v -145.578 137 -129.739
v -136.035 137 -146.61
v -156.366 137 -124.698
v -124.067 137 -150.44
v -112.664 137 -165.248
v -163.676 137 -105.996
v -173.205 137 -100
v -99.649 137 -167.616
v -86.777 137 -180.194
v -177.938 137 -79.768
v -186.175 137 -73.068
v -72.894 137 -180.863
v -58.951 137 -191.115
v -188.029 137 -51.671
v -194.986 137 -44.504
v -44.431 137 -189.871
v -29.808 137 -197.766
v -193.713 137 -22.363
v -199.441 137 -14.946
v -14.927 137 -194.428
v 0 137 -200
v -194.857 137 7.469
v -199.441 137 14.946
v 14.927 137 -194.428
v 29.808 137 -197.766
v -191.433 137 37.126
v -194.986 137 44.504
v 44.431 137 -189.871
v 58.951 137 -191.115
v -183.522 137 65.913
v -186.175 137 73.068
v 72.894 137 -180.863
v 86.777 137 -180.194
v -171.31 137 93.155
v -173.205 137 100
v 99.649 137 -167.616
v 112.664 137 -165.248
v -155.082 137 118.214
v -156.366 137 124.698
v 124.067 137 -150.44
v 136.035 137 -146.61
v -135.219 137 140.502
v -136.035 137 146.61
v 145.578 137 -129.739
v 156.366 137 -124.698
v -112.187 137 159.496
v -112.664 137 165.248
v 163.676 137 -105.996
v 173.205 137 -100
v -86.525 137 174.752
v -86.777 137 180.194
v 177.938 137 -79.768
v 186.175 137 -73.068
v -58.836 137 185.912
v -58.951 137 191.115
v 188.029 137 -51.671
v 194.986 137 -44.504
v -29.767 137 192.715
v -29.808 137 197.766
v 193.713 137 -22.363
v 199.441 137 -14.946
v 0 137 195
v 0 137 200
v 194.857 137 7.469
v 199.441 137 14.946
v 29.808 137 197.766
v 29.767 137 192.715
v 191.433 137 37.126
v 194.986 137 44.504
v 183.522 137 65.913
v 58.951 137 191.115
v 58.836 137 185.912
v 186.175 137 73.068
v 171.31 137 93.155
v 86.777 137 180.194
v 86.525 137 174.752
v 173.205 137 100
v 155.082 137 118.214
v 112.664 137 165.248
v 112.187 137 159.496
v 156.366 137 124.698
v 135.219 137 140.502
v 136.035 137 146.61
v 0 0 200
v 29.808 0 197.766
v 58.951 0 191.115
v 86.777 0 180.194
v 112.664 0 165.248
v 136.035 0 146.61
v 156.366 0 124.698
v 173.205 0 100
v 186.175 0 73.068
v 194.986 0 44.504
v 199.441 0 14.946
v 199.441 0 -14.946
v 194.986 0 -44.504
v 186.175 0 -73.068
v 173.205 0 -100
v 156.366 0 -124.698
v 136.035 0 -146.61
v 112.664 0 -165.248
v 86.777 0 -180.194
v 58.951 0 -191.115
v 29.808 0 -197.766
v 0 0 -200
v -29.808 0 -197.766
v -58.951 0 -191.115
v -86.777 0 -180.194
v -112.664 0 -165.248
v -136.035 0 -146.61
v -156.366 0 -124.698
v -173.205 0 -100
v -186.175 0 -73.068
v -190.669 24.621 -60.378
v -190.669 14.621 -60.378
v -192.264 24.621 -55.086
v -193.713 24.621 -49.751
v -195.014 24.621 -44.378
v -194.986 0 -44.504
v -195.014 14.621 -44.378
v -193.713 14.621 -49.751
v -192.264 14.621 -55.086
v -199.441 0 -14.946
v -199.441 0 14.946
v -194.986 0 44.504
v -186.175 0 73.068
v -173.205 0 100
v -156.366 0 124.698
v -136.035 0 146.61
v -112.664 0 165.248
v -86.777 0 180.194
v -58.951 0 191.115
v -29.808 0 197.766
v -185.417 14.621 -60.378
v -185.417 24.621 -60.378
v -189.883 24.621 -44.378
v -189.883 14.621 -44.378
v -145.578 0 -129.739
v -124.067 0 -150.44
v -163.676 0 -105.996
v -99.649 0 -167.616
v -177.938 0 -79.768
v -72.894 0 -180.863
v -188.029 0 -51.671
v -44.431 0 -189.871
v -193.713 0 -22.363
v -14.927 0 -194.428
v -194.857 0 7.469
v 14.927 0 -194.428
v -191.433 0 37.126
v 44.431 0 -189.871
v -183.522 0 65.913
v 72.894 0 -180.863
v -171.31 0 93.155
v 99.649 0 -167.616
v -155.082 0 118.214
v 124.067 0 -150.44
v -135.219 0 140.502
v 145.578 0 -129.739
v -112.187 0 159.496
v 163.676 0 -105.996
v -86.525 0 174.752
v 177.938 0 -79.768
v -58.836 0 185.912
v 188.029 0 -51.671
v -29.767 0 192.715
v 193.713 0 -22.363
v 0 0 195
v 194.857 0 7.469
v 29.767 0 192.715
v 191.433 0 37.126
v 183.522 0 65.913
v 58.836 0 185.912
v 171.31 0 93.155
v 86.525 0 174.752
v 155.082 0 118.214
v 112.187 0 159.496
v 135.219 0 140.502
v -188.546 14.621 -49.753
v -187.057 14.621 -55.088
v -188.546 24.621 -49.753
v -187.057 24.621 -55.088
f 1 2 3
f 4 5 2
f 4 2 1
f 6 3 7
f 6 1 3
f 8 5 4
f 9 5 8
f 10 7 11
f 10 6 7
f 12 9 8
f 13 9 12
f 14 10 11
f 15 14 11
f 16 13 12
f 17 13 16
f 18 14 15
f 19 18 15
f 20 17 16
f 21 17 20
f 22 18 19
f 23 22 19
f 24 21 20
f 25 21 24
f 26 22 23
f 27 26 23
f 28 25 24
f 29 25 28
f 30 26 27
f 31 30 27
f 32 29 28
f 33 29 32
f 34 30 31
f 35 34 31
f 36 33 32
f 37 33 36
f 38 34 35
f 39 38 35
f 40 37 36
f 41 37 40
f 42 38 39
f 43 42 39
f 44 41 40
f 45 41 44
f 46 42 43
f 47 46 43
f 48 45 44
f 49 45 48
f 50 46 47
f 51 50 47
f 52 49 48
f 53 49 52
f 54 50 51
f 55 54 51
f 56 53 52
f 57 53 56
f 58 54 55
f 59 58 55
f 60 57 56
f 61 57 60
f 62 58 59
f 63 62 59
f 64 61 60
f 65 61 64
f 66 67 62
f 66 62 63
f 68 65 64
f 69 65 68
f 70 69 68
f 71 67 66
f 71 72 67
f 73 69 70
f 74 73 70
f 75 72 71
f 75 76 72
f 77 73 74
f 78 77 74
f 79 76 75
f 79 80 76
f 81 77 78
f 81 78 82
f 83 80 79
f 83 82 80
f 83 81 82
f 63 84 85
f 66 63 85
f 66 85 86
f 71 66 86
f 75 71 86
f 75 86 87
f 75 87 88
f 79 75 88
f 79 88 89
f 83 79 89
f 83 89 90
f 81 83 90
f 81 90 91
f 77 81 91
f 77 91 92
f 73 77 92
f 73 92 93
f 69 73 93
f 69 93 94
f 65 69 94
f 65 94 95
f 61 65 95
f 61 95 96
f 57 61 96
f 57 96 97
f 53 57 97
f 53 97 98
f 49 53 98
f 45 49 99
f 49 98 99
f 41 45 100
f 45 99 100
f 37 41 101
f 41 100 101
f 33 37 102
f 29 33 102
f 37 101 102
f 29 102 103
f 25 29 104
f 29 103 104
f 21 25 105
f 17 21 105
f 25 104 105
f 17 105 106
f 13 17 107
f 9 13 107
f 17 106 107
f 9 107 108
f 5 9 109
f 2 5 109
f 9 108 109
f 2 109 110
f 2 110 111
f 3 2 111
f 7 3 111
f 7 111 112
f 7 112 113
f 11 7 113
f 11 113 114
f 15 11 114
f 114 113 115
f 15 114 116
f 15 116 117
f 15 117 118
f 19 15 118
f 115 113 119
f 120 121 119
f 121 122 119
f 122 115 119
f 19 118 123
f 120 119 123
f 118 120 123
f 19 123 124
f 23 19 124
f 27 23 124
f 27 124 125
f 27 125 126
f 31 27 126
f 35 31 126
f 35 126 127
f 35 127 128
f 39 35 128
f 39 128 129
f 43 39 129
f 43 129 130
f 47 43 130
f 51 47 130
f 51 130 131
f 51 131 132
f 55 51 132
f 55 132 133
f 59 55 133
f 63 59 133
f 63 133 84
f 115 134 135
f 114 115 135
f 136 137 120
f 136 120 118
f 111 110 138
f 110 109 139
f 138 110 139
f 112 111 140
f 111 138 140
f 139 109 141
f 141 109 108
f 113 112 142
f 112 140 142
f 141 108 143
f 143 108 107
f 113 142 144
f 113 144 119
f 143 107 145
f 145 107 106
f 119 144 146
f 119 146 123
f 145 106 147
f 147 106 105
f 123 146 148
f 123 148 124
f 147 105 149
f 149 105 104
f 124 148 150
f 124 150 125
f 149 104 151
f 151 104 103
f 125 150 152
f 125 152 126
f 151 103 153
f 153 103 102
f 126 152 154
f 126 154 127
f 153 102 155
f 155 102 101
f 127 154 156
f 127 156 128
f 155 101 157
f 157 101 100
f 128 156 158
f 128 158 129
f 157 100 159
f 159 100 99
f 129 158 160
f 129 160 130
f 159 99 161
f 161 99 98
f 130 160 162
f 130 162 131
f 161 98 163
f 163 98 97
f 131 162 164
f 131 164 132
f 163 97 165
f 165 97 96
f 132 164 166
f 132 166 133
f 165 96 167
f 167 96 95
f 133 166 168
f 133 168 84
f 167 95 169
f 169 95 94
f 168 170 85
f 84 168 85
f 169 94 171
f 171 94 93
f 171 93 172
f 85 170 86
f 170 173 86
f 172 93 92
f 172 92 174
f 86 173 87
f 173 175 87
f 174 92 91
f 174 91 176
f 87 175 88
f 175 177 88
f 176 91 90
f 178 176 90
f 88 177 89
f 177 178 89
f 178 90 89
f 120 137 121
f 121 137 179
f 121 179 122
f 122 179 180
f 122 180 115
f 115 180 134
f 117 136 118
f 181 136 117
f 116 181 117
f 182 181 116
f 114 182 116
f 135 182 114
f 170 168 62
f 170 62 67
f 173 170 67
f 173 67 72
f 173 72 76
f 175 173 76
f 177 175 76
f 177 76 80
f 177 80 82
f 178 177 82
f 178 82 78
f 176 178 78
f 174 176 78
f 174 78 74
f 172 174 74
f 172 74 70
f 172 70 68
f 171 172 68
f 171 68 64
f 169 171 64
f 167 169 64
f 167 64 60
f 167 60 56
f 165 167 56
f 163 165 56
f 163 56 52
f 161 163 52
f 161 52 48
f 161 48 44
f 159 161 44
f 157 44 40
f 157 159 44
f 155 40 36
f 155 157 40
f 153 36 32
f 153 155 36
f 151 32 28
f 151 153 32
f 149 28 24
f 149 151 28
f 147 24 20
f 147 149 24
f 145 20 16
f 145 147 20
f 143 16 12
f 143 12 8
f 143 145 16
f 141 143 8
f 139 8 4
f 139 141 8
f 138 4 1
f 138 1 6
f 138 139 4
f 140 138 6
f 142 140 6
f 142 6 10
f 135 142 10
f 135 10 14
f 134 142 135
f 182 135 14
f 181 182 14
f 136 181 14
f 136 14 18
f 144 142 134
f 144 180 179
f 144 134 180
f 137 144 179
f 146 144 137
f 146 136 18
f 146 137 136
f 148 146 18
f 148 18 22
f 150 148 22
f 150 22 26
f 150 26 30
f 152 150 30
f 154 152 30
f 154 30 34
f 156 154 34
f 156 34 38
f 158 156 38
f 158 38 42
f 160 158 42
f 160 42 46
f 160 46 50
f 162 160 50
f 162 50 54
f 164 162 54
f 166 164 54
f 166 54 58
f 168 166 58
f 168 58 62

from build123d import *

# Parameters (mm, degrees)
SKETCH1_R           = 200
SKETCH1_R_2         = 195
BOSS_EXTRUDE1_DEPTH = 137
SKETCH2_W           = 16
SKETCH2_H           = 10
CUT_EXTRUDE1_DEPTH  = 70.5


with BuildPart() as part:
    # Sketch1 → Boss-Extrude1 (new body)
    with BuildSketch(Plane(origin=(0, 0, 0), x_dir=(1, 0, 0), z_dir=(0, 1, 0))):
        with Locations(Location((0, 0, 0), (0, 0, 270))):
            Circle(SKETCH1_R)
        with Locations(Location((0, 0, 0), (0, 0, 270))):
            Circle(SKETCH1_R_2, mode=Mode.SUBTRACT)
    extrude(amount=BOSS_EXTRUDE1_DEPTH)

    # Sketch2 → Cut-Extrude1 (cut, symmetric)
    with BuildSketch(Plane(origin=(-200, 0, 0), x_dir=(0, 0, -1), z_dir=(1, 0, 0))):
        with Locations((52.378156189, 19.62104378)):
            Rectangle(SKETCH2_W, SKETCH2_H)
    extrude(amount=CUT_EXTRUDE1_DEPTH, both=True, mode=Mode.SUBTRACT)


solid = part.part
